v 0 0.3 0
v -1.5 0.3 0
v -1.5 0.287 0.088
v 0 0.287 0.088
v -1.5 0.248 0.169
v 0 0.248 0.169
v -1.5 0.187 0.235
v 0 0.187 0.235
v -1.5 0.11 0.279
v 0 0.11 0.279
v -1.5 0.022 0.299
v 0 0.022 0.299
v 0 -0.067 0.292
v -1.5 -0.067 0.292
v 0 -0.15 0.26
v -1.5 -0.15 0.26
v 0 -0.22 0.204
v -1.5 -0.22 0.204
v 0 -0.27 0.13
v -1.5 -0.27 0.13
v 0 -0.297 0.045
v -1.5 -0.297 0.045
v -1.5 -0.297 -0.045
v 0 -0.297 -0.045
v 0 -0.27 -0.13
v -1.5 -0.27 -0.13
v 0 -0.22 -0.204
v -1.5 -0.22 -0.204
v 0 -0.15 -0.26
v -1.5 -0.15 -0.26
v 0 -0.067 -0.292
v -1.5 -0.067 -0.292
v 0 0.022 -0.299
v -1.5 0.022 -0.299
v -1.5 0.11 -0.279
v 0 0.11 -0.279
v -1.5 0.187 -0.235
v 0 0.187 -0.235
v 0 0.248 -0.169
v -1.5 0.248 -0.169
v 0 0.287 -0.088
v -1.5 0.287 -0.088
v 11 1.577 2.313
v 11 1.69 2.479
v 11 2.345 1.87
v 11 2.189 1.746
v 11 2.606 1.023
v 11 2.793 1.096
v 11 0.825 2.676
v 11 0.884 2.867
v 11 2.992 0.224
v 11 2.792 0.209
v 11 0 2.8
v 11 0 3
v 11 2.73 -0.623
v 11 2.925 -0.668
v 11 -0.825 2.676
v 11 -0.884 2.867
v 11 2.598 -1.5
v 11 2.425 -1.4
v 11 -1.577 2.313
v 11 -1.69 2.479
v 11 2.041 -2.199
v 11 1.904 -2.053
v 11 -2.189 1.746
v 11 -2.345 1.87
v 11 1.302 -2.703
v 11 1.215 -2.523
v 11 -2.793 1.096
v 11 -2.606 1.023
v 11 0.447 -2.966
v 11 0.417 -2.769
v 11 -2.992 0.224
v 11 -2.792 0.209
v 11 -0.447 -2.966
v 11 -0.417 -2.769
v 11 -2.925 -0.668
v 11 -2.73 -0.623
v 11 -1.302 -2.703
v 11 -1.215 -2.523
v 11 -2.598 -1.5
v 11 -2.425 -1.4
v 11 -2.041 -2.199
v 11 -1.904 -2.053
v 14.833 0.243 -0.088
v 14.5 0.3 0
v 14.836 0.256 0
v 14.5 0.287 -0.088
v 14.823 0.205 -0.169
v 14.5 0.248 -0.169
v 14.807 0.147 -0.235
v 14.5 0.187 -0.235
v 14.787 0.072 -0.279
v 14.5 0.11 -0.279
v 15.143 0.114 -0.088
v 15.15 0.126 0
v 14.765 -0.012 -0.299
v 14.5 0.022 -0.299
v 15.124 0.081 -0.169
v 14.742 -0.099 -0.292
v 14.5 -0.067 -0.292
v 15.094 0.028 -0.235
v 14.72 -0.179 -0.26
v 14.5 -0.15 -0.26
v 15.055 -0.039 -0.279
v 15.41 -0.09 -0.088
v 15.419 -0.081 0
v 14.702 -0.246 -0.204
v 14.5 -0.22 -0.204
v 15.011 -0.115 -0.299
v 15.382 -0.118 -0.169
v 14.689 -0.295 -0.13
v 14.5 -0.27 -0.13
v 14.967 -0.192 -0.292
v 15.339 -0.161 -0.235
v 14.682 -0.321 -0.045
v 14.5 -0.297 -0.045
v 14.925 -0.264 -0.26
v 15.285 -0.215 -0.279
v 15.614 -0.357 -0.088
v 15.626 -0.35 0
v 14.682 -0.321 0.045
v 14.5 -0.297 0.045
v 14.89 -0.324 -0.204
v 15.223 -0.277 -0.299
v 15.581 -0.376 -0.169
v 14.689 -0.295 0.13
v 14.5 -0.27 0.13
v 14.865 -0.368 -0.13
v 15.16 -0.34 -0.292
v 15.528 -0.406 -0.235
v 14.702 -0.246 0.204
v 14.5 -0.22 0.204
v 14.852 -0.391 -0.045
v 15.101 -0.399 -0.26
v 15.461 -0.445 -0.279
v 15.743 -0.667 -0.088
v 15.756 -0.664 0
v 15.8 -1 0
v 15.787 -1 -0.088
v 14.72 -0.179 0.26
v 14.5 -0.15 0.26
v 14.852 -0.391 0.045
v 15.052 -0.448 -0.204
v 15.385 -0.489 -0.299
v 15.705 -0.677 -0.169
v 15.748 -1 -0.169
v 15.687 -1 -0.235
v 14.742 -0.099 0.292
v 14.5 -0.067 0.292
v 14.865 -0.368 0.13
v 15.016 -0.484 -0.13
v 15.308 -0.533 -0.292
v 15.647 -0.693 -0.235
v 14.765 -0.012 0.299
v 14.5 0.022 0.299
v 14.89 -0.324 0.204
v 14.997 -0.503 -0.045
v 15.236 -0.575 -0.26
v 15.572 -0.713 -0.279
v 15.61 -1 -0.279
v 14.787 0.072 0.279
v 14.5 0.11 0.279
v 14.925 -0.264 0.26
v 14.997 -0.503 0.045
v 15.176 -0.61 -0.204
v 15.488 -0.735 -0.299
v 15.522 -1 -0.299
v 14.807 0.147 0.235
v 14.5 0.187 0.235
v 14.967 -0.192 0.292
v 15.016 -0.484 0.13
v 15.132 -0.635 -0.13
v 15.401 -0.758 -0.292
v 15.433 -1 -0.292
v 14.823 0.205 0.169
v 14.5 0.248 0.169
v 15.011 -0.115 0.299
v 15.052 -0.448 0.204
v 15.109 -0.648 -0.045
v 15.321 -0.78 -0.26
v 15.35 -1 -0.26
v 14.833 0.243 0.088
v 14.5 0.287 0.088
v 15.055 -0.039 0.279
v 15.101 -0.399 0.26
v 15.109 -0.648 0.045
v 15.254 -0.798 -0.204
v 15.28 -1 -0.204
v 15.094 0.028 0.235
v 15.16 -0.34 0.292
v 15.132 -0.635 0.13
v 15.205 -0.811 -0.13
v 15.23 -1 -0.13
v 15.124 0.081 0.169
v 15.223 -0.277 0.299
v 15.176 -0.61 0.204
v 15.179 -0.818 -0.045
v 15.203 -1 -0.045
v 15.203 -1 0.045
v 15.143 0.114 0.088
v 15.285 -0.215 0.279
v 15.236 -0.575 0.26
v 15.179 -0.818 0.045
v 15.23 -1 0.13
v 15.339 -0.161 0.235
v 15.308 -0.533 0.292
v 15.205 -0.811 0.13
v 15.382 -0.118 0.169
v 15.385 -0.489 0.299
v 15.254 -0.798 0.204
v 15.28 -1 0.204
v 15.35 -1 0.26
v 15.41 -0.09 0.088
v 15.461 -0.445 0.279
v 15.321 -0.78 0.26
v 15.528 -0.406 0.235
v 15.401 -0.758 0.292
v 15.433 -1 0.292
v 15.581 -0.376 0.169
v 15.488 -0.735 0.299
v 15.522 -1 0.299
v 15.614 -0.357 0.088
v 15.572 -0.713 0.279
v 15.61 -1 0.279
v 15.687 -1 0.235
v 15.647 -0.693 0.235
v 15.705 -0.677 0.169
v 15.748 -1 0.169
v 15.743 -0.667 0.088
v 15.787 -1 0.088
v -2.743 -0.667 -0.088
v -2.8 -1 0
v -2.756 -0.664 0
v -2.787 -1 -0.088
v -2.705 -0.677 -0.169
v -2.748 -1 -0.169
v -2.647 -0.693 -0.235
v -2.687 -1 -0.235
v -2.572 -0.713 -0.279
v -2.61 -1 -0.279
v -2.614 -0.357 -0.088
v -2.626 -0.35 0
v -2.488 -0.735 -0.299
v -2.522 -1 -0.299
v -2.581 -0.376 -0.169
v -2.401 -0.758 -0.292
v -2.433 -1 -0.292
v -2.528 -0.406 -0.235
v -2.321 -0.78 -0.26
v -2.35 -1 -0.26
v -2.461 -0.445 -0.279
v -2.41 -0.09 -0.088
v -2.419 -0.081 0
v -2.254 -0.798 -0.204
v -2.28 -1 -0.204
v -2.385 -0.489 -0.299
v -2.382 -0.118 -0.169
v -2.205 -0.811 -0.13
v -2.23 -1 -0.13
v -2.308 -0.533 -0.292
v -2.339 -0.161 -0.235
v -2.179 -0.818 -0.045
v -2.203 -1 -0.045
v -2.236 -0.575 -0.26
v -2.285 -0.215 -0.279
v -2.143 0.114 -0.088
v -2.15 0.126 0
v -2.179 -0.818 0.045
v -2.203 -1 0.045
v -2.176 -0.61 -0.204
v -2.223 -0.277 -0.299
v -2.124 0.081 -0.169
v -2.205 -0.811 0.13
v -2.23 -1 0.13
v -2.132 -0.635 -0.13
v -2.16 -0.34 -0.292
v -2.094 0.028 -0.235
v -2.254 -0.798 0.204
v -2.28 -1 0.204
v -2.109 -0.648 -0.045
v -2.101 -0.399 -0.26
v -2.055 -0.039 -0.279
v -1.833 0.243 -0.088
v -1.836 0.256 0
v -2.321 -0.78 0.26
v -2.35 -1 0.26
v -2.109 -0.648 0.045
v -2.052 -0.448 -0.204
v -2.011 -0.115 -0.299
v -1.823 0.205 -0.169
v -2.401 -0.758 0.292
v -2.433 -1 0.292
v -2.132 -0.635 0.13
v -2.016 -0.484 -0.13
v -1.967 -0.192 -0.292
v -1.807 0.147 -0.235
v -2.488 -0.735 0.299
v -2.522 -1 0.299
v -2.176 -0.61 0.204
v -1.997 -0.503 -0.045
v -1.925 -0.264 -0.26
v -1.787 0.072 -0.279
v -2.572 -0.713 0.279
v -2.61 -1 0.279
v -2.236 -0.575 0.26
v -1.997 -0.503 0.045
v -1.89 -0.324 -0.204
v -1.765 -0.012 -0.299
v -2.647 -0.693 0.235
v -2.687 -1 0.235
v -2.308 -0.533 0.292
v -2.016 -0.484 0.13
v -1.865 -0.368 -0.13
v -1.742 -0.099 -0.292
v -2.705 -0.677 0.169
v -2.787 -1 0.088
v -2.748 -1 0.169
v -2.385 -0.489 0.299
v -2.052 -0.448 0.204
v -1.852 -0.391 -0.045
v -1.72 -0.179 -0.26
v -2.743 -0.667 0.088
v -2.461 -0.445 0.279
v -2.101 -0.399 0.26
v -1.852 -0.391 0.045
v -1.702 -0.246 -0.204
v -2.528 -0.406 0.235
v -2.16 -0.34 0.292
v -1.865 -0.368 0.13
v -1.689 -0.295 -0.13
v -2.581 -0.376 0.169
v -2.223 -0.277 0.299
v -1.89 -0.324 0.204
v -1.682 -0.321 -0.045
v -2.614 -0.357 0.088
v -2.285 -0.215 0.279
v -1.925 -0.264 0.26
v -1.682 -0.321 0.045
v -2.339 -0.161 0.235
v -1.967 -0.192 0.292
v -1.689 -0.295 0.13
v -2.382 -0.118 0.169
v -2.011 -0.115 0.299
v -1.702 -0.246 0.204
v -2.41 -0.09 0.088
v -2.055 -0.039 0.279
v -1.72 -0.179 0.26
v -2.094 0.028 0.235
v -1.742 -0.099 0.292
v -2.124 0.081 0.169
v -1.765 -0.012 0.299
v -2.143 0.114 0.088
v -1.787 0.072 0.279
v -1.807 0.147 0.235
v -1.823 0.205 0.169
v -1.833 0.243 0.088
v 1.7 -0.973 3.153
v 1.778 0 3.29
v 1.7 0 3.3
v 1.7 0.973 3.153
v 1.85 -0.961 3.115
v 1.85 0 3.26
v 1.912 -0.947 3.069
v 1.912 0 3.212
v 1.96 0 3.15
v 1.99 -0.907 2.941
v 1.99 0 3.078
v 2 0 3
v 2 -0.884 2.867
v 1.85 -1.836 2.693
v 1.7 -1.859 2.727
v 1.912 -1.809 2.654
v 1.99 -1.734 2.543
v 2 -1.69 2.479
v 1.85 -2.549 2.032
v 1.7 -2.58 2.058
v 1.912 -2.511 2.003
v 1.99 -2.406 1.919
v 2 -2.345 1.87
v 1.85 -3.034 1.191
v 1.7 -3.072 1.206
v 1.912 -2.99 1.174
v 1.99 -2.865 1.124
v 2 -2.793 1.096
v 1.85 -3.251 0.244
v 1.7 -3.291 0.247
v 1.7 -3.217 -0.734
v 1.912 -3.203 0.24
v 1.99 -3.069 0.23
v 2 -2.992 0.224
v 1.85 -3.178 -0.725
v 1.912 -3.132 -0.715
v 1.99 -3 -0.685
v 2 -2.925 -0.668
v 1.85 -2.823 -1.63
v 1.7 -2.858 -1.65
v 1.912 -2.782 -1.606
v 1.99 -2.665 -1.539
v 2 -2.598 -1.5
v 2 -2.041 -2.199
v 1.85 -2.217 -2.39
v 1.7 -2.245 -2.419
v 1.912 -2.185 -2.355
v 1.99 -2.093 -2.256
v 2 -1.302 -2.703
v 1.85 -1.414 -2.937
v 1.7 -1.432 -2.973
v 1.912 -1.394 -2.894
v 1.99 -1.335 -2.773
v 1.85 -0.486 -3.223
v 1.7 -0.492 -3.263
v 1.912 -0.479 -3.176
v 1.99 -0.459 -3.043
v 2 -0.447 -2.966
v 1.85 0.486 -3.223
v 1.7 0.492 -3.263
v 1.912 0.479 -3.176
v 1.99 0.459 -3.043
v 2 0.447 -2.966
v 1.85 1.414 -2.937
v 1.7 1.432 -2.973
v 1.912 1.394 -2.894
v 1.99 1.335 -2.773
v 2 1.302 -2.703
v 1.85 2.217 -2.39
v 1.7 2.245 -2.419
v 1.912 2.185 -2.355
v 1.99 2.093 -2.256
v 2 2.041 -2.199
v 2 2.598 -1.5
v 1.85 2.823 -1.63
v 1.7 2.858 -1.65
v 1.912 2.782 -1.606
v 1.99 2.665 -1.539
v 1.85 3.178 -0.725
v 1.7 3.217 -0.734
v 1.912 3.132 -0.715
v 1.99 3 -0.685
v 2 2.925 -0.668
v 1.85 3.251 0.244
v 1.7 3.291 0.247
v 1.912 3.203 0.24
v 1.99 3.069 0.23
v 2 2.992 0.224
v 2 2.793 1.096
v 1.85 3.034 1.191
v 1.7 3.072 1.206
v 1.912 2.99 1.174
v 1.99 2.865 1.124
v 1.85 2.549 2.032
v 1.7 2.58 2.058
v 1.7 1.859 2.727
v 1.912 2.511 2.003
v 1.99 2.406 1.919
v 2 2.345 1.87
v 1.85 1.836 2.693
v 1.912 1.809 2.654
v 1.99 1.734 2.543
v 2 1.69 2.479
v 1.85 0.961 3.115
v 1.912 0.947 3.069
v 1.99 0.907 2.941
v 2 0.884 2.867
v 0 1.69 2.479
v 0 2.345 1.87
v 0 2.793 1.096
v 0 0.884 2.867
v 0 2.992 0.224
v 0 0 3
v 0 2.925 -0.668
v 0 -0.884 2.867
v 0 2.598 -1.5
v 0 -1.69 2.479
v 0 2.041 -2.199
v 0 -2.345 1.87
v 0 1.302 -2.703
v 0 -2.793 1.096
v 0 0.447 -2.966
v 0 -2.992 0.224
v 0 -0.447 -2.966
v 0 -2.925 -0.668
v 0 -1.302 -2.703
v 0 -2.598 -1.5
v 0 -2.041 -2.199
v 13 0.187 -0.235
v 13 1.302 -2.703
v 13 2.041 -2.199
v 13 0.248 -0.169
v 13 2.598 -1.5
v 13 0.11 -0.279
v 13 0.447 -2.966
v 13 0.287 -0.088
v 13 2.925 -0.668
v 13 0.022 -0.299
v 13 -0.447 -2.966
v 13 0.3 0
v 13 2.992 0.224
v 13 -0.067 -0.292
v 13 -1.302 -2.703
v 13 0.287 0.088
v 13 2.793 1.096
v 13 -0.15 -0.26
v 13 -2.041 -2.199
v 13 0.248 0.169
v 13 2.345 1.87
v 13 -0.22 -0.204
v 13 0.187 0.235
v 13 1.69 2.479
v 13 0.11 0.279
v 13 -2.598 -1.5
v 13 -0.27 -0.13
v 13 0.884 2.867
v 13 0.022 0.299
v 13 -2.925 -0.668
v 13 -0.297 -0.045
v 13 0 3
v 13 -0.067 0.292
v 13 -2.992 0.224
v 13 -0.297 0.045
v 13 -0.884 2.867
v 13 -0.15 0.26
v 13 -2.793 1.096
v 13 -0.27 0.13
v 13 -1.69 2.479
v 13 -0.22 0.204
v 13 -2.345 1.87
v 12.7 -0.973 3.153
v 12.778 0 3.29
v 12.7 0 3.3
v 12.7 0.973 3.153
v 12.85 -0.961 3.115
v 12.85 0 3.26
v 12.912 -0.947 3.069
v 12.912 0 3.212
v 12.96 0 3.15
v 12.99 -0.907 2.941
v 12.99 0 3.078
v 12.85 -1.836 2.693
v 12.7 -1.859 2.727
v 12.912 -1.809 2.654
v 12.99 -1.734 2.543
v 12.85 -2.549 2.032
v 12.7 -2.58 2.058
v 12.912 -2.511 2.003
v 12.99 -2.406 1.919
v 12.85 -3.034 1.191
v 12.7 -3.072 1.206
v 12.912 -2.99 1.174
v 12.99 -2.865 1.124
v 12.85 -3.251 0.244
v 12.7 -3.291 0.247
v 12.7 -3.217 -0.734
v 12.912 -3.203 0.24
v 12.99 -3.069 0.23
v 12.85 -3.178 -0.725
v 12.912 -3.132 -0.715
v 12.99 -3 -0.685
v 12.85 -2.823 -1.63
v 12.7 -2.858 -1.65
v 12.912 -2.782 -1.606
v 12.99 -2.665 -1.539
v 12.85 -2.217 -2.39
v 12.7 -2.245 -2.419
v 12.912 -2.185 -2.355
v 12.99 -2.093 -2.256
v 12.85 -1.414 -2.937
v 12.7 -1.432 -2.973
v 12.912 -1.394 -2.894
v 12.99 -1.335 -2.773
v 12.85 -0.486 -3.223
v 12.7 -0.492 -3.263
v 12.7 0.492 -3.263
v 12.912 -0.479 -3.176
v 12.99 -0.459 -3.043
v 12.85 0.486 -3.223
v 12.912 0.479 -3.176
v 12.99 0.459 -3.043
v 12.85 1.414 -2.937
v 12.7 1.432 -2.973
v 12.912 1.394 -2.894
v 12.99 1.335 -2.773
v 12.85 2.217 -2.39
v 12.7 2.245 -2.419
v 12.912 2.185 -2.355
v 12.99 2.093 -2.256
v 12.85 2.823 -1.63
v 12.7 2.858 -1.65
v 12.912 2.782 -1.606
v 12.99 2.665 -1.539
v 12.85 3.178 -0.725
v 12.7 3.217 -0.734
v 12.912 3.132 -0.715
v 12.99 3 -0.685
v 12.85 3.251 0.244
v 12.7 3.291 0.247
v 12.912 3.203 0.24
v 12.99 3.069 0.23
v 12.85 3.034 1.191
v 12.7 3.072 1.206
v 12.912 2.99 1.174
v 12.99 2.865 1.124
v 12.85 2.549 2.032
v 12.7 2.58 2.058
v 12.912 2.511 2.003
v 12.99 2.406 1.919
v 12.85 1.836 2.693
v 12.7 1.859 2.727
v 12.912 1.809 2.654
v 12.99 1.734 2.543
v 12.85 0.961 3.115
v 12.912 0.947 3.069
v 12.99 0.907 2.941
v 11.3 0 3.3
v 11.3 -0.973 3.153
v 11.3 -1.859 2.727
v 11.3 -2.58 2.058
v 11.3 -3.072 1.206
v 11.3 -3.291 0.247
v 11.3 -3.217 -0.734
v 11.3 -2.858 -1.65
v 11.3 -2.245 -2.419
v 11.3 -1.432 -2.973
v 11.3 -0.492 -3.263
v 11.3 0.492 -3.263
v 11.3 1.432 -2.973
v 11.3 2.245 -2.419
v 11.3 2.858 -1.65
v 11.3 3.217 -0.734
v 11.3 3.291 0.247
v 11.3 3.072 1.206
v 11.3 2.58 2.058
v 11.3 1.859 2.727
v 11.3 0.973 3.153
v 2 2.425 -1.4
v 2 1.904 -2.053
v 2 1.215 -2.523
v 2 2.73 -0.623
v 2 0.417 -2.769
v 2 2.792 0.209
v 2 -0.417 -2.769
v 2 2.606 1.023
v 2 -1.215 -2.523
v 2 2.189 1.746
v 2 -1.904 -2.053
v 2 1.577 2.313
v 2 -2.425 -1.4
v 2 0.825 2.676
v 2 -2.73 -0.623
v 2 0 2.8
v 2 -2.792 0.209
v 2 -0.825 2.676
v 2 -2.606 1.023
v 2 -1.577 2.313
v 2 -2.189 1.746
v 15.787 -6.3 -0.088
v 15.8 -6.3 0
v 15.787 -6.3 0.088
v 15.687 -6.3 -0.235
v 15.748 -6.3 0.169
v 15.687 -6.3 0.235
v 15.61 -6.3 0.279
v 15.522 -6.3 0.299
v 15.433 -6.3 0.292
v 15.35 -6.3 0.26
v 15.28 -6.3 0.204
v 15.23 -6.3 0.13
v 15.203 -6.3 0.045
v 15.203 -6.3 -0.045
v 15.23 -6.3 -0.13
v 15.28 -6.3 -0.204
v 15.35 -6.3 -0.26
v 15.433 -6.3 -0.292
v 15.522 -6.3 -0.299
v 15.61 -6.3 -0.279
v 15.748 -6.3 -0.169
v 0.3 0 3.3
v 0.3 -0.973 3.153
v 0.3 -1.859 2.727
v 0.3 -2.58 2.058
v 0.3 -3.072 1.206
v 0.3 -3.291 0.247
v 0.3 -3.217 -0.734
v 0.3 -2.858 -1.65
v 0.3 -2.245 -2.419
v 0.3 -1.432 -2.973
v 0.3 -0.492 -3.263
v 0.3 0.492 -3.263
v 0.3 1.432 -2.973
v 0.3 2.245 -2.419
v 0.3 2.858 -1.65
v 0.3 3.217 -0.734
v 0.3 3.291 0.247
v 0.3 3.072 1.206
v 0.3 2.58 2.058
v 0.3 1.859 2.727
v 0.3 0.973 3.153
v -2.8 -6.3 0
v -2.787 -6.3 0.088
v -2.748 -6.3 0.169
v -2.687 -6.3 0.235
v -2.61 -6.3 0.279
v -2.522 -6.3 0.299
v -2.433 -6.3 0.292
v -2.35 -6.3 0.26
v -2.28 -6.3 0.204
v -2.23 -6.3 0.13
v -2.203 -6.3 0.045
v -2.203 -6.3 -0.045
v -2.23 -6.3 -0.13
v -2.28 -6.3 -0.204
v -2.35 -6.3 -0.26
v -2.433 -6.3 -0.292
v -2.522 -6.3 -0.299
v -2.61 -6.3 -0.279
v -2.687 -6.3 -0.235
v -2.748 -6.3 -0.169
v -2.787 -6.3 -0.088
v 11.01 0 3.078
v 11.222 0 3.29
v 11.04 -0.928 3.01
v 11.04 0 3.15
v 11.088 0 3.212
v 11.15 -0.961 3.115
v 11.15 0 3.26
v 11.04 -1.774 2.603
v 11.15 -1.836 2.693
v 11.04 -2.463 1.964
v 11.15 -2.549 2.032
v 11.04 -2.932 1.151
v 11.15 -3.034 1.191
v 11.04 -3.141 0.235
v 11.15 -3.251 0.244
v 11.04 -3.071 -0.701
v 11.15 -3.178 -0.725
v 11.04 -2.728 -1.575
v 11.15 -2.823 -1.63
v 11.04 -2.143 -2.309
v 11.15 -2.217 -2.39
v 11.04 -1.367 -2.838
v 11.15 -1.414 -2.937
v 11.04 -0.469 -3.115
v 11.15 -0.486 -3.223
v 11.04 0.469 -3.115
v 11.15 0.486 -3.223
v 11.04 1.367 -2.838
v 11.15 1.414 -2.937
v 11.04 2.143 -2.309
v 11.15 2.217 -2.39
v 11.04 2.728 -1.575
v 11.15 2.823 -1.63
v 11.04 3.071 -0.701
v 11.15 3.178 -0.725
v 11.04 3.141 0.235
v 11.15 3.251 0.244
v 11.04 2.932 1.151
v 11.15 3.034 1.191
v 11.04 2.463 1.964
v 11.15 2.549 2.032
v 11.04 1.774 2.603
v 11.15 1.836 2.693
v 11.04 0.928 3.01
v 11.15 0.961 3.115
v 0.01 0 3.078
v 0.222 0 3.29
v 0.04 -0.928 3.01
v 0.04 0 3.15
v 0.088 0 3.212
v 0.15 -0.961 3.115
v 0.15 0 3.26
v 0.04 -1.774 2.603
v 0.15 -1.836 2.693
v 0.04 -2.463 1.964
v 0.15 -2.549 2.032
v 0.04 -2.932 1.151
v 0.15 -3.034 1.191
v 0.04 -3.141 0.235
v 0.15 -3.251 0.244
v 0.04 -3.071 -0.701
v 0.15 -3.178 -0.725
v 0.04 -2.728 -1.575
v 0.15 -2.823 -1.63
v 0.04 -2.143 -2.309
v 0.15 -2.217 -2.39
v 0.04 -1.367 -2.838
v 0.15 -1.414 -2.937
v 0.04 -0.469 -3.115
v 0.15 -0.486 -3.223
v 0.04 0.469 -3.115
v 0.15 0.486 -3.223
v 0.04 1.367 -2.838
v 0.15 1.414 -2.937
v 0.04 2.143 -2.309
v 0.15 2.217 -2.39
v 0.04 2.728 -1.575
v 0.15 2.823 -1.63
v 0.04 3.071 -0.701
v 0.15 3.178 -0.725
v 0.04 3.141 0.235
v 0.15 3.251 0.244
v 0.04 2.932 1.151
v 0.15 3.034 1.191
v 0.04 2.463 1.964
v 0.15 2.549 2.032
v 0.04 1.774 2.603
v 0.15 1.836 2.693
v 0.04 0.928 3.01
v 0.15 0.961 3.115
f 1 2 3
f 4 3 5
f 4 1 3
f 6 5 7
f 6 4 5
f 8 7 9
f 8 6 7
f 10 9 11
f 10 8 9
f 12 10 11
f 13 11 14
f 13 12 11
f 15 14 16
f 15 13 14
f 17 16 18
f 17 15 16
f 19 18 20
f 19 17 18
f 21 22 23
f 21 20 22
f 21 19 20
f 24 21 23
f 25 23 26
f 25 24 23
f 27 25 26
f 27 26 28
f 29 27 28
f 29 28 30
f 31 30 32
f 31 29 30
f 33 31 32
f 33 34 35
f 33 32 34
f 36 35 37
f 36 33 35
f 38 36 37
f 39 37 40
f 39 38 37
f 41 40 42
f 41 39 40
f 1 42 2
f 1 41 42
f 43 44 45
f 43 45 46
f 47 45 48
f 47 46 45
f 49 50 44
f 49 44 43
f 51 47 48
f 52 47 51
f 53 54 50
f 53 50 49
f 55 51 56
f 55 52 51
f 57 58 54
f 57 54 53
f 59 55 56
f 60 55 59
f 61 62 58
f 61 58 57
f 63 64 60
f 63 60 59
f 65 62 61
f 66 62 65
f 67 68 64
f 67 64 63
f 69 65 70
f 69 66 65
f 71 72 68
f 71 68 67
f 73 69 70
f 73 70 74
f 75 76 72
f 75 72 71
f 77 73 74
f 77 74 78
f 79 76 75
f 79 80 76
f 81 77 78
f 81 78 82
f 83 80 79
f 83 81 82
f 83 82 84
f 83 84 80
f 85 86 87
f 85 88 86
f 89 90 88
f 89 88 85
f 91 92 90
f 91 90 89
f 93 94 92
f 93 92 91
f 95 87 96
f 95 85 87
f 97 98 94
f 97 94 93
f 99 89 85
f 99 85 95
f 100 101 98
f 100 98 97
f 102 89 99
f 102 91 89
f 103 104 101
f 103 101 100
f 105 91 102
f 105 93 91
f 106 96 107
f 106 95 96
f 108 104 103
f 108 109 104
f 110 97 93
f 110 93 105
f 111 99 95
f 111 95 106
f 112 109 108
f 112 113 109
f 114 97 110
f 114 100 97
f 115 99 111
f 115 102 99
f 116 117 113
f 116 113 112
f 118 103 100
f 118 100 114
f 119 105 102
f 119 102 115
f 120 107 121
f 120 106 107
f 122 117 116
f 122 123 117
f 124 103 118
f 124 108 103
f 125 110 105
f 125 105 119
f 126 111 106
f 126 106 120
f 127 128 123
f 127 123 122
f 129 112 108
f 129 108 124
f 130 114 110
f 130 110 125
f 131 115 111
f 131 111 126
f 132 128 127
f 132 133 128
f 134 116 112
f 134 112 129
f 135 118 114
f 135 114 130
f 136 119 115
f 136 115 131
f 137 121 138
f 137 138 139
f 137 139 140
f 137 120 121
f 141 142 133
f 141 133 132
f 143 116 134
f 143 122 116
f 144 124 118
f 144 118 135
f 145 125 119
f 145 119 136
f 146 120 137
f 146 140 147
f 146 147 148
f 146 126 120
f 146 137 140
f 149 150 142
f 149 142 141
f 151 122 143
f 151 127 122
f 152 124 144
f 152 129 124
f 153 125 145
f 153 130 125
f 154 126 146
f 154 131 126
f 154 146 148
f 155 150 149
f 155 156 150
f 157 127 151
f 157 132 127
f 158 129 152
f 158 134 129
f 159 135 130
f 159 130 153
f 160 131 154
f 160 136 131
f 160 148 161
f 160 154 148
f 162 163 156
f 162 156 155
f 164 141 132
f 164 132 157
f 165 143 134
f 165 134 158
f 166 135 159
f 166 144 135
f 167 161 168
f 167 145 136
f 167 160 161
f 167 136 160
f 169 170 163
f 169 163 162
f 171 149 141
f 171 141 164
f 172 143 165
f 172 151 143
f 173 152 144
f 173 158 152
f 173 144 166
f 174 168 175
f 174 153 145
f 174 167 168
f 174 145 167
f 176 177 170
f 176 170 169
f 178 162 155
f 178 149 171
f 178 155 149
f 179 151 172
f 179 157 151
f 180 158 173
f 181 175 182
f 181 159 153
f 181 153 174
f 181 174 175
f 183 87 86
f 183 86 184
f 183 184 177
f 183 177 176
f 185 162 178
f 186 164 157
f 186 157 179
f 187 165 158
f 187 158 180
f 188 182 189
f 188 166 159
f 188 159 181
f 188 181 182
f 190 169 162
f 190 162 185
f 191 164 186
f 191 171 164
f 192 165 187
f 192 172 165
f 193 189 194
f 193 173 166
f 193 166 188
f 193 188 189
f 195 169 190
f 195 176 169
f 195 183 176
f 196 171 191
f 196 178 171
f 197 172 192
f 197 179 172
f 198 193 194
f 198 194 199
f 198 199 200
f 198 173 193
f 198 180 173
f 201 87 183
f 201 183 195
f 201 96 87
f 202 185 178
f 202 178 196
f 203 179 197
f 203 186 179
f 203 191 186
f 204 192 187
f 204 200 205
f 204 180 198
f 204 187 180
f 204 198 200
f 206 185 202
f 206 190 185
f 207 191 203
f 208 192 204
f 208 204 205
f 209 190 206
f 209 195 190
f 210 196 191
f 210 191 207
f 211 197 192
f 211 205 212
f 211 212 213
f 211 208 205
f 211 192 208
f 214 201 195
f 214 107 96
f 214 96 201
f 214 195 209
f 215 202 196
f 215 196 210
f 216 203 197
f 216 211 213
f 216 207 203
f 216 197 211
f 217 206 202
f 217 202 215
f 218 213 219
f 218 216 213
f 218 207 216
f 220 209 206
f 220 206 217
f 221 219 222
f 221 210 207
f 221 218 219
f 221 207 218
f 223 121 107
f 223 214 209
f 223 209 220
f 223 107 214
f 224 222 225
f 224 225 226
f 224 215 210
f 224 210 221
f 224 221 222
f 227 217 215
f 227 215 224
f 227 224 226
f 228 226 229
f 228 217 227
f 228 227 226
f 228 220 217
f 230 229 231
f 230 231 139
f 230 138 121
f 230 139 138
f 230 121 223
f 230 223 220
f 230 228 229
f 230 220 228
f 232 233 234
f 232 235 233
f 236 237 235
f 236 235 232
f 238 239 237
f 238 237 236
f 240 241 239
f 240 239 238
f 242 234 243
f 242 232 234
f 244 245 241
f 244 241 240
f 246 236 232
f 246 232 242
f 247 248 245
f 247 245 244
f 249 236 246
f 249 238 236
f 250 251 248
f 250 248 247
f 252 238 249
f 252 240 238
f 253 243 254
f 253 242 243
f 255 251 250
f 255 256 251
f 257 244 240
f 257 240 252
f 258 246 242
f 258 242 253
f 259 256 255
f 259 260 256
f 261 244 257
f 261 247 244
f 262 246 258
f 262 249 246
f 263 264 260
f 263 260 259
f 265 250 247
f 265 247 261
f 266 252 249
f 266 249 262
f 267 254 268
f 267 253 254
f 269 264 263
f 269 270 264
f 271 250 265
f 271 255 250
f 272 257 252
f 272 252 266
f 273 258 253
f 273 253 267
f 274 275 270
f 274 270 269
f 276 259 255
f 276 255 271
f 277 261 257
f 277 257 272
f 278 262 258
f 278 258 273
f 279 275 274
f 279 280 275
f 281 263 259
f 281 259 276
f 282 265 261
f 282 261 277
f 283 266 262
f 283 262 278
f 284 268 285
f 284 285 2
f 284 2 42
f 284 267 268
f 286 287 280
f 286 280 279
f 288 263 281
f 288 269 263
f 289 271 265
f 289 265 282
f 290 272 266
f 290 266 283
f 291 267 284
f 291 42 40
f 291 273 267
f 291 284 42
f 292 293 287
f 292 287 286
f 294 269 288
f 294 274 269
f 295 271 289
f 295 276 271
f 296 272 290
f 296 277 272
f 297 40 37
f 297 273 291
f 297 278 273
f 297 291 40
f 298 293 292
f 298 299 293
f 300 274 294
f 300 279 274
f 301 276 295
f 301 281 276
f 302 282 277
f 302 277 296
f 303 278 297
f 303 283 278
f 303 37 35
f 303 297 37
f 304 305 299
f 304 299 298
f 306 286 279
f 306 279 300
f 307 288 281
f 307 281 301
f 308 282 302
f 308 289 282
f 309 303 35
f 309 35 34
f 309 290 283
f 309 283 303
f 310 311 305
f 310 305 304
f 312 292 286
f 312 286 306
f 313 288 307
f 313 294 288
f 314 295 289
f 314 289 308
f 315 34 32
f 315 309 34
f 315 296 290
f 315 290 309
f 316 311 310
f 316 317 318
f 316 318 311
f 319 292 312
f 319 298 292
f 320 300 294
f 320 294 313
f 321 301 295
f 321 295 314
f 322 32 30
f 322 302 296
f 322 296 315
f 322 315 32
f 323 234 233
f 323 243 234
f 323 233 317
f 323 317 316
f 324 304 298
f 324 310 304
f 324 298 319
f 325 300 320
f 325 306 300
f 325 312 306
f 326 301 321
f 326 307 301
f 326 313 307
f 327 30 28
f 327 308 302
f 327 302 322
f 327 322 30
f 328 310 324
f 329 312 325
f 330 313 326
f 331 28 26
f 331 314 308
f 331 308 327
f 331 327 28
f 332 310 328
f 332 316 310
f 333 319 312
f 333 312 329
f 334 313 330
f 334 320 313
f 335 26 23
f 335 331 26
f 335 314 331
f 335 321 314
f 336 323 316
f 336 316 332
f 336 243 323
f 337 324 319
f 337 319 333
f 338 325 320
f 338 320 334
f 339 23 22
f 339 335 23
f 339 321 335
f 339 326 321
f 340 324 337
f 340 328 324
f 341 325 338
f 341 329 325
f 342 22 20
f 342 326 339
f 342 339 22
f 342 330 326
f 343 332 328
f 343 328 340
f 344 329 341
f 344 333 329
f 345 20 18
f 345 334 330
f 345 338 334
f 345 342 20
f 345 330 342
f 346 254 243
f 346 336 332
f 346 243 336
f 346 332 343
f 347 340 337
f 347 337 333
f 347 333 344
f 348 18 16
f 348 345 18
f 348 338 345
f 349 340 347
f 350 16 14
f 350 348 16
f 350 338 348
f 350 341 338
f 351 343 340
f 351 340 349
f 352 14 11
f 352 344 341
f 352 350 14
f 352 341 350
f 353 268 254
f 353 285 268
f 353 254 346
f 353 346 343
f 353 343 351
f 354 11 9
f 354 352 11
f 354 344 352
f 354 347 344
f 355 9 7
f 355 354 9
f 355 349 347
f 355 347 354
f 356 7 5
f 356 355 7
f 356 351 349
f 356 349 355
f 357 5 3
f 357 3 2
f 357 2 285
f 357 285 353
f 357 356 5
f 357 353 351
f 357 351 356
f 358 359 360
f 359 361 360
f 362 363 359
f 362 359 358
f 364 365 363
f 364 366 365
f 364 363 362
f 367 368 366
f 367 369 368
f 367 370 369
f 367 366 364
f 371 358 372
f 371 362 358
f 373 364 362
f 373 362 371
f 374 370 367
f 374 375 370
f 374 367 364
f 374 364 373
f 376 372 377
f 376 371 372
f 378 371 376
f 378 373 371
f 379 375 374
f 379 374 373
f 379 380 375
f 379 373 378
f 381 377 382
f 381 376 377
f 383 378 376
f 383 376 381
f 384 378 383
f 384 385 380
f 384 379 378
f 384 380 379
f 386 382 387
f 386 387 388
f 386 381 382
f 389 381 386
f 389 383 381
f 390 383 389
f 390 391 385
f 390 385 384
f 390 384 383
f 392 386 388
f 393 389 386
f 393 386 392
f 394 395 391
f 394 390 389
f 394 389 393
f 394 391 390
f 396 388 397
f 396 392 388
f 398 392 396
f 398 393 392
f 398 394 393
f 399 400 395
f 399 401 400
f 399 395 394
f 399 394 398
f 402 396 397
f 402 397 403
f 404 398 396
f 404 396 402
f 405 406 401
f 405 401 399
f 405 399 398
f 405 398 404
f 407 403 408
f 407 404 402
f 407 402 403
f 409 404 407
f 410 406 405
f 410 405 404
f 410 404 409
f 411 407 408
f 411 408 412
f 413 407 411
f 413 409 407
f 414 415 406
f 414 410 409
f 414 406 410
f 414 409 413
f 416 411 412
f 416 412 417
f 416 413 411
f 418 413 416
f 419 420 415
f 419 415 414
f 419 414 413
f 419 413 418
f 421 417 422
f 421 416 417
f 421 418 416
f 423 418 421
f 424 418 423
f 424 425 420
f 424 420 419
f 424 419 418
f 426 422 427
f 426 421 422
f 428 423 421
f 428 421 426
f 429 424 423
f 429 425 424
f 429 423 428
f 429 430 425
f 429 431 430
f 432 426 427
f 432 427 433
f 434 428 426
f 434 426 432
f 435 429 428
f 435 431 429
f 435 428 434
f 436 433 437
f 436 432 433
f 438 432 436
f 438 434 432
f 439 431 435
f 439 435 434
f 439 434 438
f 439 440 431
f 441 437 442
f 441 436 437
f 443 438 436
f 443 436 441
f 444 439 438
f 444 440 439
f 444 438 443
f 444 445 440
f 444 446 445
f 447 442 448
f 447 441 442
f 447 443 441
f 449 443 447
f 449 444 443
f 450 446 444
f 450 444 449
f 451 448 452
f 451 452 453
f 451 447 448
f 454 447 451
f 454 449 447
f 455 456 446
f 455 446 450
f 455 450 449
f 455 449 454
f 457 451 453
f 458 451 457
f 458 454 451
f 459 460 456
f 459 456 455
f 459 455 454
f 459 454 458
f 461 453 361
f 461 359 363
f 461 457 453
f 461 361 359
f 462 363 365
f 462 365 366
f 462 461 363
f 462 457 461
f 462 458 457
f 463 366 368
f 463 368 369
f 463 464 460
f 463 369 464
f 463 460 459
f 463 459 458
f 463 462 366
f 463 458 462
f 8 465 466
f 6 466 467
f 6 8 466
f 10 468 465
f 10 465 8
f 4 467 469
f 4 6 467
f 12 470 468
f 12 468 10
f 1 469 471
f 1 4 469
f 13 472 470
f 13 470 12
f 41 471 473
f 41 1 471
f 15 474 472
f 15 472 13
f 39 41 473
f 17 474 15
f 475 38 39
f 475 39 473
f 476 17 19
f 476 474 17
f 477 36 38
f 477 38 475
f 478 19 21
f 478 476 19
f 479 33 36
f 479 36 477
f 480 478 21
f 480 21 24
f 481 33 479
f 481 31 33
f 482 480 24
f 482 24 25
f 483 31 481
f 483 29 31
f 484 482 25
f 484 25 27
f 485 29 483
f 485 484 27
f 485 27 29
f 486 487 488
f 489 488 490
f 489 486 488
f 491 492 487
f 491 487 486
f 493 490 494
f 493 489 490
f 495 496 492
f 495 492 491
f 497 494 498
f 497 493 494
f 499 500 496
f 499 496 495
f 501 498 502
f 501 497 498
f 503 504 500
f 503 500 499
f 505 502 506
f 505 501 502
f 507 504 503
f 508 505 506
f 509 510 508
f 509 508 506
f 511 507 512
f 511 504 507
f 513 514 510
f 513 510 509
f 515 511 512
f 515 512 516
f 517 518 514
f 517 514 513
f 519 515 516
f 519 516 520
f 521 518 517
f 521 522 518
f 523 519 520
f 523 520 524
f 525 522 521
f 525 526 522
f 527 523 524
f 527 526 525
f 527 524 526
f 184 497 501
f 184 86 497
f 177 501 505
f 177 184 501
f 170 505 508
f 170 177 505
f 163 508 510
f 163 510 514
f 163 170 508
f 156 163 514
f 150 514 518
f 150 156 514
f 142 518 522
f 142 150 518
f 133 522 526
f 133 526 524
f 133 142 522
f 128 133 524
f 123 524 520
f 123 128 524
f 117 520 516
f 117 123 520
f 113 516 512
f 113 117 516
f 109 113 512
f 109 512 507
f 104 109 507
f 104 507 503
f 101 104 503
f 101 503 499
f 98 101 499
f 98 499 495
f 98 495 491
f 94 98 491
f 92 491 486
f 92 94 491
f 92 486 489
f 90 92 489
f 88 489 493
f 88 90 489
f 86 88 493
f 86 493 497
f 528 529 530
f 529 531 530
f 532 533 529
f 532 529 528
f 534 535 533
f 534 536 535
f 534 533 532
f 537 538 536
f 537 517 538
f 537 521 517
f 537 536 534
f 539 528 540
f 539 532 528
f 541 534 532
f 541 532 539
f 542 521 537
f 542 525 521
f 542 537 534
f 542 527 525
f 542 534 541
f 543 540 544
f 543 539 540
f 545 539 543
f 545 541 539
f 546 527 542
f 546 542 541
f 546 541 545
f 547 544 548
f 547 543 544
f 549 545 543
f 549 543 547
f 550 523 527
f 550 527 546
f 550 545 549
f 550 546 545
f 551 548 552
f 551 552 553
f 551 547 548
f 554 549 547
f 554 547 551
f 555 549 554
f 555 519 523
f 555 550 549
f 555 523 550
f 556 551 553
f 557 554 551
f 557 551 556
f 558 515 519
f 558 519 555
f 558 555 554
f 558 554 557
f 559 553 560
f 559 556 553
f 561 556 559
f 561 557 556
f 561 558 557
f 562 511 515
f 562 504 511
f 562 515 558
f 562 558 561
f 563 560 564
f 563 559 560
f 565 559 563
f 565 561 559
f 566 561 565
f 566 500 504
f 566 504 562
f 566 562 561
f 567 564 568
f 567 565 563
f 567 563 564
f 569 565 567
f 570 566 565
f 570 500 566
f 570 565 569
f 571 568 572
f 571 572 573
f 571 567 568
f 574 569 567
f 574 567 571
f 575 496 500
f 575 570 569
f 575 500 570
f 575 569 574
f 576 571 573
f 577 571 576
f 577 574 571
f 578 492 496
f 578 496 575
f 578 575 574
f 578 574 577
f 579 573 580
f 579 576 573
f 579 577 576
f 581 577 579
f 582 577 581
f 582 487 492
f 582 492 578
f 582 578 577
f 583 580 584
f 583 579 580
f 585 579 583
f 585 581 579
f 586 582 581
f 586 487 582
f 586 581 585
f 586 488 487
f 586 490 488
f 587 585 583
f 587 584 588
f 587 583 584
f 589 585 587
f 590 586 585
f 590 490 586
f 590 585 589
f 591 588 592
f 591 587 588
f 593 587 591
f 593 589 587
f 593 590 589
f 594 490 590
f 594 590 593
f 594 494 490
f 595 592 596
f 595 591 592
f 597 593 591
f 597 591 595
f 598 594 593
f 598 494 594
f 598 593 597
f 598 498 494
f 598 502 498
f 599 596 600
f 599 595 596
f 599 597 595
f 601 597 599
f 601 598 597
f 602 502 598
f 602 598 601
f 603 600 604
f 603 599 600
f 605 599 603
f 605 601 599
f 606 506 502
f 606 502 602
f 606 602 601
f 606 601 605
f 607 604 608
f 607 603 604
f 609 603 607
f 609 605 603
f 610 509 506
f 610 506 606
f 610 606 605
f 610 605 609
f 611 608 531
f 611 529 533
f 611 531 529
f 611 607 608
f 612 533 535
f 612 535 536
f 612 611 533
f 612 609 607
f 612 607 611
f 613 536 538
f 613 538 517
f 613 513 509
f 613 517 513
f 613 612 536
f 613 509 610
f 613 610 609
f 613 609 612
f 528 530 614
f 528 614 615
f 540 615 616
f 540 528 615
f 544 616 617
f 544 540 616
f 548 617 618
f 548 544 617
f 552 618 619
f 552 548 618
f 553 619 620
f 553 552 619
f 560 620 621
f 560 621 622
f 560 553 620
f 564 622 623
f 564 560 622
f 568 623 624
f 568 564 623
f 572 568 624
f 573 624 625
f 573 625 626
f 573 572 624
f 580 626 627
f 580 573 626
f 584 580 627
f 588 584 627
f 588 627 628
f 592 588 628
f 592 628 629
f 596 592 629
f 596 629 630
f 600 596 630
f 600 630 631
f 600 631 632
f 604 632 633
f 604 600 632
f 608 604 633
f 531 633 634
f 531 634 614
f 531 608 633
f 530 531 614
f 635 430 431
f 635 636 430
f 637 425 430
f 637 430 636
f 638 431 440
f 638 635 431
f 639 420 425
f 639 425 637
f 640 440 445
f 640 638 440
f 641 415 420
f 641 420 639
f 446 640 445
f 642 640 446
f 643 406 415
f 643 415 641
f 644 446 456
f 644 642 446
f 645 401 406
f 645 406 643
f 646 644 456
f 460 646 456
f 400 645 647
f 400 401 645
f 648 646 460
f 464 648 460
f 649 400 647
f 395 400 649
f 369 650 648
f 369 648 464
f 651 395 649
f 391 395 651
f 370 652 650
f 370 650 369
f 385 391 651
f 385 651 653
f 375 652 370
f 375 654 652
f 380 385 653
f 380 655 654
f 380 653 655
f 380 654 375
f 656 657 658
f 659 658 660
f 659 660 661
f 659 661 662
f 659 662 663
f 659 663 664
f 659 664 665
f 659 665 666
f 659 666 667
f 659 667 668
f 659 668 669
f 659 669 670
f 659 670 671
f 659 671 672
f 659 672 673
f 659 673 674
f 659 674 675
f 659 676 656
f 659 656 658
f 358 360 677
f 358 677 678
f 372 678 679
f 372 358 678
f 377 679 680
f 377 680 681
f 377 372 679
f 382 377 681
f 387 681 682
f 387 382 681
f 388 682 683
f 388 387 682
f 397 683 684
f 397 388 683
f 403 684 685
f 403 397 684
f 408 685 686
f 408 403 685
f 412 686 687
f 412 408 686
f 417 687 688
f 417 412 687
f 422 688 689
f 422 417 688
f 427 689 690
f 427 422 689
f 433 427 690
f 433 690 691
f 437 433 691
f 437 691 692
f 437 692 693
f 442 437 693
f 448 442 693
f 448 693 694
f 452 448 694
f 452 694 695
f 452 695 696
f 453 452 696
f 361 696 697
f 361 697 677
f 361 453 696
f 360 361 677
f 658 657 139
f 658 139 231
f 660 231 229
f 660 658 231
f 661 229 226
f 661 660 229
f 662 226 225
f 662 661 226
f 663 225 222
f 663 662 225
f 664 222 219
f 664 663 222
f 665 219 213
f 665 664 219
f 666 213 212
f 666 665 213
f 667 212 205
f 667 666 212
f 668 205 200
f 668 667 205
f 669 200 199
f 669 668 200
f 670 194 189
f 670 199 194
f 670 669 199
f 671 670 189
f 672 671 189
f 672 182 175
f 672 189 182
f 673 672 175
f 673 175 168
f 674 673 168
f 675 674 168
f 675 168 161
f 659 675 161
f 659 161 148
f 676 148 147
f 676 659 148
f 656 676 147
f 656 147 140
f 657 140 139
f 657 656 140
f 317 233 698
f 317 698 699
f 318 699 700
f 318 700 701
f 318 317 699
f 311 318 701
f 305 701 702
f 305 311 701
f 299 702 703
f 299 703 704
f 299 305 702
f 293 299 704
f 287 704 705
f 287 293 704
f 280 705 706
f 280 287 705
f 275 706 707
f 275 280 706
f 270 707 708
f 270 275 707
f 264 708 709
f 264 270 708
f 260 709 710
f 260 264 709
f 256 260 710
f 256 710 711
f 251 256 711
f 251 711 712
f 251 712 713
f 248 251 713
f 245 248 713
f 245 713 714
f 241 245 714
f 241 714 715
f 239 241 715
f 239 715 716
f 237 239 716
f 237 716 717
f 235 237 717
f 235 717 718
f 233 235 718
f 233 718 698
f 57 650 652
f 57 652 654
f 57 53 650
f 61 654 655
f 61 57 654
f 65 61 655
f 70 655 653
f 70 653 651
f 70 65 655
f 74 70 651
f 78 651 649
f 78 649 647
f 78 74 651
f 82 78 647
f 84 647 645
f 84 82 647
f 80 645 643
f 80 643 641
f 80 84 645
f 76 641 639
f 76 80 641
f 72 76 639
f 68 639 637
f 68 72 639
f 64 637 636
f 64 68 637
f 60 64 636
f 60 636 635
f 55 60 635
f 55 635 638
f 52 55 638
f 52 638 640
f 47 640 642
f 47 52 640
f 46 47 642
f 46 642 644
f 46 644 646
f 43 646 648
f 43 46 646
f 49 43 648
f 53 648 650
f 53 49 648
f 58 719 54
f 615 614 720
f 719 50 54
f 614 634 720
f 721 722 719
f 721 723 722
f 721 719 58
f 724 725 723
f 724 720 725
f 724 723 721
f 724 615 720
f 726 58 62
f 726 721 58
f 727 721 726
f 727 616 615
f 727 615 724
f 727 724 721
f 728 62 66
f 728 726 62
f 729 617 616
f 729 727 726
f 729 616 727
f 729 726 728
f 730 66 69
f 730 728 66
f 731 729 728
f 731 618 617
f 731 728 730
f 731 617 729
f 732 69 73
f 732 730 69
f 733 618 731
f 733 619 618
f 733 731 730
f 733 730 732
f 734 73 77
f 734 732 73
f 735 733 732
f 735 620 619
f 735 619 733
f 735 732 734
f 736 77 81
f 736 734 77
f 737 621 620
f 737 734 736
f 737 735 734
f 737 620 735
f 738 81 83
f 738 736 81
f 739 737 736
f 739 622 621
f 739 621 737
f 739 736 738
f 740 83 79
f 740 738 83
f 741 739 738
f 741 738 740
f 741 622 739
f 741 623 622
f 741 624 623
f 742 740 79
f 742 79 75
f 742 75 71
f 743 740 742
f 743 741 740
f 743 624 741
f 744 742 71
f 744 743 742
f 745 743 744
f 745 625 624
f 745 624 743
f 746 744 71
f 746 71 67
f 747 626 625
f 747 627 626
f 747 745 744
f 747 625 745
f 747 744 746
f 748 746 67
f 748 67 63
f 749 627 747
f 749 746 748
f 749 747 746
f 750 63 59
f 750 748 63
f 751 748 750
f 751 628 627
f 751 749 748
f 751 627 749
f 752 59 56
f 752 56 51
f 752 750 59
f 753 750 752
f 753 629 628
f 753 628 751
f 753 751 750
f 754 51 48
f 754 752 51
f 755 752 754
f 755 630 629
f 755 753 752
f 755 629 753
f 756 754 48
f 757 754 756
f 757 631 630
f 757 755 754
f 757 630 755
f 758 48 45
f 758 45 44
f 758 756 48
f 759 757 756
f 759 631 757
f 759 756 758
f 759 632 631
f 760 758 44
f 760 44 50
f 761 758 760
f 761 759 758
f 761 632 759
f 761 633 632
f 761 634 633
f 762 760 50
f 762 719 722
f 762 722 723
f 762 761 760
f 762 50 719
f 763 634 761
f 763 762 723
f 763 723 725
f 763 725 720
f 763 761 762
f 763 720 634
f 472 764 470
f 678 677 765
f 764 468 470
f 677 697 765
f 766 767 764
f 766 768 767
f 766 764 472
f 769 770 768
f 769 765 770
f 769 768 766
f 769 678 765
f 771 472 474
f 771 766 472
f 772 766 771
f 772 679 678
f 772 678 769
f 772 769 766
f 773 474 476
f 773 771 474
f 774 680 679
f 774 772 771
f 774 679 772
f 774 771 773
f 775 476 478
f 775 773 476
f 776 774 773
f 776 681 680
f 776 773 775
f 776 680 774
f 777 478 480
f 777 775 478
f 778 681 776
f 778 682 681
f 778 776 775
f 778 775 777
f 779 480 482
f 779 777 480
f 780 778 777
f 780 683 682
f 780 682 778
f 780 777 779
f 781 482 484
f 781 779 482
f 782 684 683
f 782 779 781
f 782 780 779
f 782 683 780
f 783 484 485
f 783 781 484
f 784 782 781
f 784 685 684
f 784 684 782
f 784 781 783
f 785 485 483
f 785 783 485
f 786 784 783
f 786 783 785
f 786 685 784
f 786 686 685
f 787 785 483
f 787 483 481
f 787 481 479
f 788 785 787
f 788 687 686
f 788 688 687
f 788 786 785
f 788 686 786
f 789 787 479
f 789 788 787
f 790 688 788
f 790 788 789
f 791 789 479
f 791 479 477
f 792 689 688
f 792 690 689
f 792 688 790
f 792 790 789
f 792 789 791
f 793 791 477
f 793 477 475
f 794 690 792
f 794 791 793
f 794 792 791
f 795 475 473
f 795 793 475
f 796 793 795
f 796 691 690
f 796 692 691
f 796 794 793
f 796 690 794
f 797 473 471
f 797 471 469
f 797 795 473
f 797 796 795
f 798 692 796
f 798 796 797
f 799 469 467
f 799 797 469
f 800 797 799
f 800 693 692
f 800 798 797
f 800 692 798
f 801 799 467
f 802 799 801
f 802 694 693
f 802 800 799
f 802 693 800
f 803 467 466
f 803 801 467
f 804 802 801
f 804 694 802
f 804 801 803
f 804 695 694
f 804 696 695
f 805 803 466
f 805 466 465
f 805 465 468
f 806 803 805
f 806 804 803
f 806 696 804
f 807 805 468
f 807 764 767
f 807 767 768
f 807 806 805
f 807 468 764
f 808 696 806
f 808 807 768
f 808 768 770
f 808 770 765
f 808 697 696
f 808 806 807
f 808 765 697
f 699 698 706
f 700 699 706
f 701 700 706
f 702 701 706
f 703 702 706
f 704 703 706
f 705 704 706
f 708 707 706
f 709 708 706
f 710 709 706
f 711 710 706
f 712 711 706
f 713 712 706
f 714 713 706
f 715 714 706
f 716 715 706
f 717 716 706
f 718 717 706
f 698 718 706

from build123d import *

# Parameters (mm, degrees)
SKETCH_3_R = 0.3
FILLET_1_R = 0.3


with BuildPart() as part:
    # Эскиз1 → Повернуть1 (revolve)
    with BuildSketch(Plane.XY, mode=Mode.PRIVATE) as revolve_1_sk:
        Polygon((0, 0), (0, 3.3), (2, 3.3), (2, 2.8), (11, 2.8), (11, 3.3), (13, 3.3), (13, 0), align=None)
    revolve(revolve_1_sk.sketch.rotate(Axis((0, 0, 0), (1, 0, 0)), 90), axis=Axis((0, 0, 0), (1, 0, 0)))

    # По траектории1: sweep along a path in Эскиз2
    with BuildLine(Plane.XY) as sweep_1_path:
        Line((-2.5, -6.3), (-2.5, -1))
        ThreePointArc((-2.5, -1), (-2.207106781, -0.292893219), (-1.5, 0))
        Line((-1.5, 0), (14.5, 0))
        ThreePointArc((14.5, 0), (15.207106781, -0.292893219), (15.5, -1))
        Line((15.5, -1), (15.5, -6.3))
    # Эскиз3 → По траектории1 (sweep)
    with BuildSketch(Plane(origin=(-2.5, -6.3, 0), x_dir=(-1, 0, 0), z_dir=(0, 1, 0))):
        Circle(SKETCH_3_R)
    sweep(path=sweep_1_path.line)

    # Скругление1
    fillet_1_edges = [part.edges().sort_by_distance(p)[0] for p in [
        (13, 0, -3.3),
        (11, 0, -3.3),
        (2, 0, -3.3),
        (0, 0, -3.3),
    ]]
    fillet(fillet_1_edges, radius=FILLET_1_R)


solid = part.part
